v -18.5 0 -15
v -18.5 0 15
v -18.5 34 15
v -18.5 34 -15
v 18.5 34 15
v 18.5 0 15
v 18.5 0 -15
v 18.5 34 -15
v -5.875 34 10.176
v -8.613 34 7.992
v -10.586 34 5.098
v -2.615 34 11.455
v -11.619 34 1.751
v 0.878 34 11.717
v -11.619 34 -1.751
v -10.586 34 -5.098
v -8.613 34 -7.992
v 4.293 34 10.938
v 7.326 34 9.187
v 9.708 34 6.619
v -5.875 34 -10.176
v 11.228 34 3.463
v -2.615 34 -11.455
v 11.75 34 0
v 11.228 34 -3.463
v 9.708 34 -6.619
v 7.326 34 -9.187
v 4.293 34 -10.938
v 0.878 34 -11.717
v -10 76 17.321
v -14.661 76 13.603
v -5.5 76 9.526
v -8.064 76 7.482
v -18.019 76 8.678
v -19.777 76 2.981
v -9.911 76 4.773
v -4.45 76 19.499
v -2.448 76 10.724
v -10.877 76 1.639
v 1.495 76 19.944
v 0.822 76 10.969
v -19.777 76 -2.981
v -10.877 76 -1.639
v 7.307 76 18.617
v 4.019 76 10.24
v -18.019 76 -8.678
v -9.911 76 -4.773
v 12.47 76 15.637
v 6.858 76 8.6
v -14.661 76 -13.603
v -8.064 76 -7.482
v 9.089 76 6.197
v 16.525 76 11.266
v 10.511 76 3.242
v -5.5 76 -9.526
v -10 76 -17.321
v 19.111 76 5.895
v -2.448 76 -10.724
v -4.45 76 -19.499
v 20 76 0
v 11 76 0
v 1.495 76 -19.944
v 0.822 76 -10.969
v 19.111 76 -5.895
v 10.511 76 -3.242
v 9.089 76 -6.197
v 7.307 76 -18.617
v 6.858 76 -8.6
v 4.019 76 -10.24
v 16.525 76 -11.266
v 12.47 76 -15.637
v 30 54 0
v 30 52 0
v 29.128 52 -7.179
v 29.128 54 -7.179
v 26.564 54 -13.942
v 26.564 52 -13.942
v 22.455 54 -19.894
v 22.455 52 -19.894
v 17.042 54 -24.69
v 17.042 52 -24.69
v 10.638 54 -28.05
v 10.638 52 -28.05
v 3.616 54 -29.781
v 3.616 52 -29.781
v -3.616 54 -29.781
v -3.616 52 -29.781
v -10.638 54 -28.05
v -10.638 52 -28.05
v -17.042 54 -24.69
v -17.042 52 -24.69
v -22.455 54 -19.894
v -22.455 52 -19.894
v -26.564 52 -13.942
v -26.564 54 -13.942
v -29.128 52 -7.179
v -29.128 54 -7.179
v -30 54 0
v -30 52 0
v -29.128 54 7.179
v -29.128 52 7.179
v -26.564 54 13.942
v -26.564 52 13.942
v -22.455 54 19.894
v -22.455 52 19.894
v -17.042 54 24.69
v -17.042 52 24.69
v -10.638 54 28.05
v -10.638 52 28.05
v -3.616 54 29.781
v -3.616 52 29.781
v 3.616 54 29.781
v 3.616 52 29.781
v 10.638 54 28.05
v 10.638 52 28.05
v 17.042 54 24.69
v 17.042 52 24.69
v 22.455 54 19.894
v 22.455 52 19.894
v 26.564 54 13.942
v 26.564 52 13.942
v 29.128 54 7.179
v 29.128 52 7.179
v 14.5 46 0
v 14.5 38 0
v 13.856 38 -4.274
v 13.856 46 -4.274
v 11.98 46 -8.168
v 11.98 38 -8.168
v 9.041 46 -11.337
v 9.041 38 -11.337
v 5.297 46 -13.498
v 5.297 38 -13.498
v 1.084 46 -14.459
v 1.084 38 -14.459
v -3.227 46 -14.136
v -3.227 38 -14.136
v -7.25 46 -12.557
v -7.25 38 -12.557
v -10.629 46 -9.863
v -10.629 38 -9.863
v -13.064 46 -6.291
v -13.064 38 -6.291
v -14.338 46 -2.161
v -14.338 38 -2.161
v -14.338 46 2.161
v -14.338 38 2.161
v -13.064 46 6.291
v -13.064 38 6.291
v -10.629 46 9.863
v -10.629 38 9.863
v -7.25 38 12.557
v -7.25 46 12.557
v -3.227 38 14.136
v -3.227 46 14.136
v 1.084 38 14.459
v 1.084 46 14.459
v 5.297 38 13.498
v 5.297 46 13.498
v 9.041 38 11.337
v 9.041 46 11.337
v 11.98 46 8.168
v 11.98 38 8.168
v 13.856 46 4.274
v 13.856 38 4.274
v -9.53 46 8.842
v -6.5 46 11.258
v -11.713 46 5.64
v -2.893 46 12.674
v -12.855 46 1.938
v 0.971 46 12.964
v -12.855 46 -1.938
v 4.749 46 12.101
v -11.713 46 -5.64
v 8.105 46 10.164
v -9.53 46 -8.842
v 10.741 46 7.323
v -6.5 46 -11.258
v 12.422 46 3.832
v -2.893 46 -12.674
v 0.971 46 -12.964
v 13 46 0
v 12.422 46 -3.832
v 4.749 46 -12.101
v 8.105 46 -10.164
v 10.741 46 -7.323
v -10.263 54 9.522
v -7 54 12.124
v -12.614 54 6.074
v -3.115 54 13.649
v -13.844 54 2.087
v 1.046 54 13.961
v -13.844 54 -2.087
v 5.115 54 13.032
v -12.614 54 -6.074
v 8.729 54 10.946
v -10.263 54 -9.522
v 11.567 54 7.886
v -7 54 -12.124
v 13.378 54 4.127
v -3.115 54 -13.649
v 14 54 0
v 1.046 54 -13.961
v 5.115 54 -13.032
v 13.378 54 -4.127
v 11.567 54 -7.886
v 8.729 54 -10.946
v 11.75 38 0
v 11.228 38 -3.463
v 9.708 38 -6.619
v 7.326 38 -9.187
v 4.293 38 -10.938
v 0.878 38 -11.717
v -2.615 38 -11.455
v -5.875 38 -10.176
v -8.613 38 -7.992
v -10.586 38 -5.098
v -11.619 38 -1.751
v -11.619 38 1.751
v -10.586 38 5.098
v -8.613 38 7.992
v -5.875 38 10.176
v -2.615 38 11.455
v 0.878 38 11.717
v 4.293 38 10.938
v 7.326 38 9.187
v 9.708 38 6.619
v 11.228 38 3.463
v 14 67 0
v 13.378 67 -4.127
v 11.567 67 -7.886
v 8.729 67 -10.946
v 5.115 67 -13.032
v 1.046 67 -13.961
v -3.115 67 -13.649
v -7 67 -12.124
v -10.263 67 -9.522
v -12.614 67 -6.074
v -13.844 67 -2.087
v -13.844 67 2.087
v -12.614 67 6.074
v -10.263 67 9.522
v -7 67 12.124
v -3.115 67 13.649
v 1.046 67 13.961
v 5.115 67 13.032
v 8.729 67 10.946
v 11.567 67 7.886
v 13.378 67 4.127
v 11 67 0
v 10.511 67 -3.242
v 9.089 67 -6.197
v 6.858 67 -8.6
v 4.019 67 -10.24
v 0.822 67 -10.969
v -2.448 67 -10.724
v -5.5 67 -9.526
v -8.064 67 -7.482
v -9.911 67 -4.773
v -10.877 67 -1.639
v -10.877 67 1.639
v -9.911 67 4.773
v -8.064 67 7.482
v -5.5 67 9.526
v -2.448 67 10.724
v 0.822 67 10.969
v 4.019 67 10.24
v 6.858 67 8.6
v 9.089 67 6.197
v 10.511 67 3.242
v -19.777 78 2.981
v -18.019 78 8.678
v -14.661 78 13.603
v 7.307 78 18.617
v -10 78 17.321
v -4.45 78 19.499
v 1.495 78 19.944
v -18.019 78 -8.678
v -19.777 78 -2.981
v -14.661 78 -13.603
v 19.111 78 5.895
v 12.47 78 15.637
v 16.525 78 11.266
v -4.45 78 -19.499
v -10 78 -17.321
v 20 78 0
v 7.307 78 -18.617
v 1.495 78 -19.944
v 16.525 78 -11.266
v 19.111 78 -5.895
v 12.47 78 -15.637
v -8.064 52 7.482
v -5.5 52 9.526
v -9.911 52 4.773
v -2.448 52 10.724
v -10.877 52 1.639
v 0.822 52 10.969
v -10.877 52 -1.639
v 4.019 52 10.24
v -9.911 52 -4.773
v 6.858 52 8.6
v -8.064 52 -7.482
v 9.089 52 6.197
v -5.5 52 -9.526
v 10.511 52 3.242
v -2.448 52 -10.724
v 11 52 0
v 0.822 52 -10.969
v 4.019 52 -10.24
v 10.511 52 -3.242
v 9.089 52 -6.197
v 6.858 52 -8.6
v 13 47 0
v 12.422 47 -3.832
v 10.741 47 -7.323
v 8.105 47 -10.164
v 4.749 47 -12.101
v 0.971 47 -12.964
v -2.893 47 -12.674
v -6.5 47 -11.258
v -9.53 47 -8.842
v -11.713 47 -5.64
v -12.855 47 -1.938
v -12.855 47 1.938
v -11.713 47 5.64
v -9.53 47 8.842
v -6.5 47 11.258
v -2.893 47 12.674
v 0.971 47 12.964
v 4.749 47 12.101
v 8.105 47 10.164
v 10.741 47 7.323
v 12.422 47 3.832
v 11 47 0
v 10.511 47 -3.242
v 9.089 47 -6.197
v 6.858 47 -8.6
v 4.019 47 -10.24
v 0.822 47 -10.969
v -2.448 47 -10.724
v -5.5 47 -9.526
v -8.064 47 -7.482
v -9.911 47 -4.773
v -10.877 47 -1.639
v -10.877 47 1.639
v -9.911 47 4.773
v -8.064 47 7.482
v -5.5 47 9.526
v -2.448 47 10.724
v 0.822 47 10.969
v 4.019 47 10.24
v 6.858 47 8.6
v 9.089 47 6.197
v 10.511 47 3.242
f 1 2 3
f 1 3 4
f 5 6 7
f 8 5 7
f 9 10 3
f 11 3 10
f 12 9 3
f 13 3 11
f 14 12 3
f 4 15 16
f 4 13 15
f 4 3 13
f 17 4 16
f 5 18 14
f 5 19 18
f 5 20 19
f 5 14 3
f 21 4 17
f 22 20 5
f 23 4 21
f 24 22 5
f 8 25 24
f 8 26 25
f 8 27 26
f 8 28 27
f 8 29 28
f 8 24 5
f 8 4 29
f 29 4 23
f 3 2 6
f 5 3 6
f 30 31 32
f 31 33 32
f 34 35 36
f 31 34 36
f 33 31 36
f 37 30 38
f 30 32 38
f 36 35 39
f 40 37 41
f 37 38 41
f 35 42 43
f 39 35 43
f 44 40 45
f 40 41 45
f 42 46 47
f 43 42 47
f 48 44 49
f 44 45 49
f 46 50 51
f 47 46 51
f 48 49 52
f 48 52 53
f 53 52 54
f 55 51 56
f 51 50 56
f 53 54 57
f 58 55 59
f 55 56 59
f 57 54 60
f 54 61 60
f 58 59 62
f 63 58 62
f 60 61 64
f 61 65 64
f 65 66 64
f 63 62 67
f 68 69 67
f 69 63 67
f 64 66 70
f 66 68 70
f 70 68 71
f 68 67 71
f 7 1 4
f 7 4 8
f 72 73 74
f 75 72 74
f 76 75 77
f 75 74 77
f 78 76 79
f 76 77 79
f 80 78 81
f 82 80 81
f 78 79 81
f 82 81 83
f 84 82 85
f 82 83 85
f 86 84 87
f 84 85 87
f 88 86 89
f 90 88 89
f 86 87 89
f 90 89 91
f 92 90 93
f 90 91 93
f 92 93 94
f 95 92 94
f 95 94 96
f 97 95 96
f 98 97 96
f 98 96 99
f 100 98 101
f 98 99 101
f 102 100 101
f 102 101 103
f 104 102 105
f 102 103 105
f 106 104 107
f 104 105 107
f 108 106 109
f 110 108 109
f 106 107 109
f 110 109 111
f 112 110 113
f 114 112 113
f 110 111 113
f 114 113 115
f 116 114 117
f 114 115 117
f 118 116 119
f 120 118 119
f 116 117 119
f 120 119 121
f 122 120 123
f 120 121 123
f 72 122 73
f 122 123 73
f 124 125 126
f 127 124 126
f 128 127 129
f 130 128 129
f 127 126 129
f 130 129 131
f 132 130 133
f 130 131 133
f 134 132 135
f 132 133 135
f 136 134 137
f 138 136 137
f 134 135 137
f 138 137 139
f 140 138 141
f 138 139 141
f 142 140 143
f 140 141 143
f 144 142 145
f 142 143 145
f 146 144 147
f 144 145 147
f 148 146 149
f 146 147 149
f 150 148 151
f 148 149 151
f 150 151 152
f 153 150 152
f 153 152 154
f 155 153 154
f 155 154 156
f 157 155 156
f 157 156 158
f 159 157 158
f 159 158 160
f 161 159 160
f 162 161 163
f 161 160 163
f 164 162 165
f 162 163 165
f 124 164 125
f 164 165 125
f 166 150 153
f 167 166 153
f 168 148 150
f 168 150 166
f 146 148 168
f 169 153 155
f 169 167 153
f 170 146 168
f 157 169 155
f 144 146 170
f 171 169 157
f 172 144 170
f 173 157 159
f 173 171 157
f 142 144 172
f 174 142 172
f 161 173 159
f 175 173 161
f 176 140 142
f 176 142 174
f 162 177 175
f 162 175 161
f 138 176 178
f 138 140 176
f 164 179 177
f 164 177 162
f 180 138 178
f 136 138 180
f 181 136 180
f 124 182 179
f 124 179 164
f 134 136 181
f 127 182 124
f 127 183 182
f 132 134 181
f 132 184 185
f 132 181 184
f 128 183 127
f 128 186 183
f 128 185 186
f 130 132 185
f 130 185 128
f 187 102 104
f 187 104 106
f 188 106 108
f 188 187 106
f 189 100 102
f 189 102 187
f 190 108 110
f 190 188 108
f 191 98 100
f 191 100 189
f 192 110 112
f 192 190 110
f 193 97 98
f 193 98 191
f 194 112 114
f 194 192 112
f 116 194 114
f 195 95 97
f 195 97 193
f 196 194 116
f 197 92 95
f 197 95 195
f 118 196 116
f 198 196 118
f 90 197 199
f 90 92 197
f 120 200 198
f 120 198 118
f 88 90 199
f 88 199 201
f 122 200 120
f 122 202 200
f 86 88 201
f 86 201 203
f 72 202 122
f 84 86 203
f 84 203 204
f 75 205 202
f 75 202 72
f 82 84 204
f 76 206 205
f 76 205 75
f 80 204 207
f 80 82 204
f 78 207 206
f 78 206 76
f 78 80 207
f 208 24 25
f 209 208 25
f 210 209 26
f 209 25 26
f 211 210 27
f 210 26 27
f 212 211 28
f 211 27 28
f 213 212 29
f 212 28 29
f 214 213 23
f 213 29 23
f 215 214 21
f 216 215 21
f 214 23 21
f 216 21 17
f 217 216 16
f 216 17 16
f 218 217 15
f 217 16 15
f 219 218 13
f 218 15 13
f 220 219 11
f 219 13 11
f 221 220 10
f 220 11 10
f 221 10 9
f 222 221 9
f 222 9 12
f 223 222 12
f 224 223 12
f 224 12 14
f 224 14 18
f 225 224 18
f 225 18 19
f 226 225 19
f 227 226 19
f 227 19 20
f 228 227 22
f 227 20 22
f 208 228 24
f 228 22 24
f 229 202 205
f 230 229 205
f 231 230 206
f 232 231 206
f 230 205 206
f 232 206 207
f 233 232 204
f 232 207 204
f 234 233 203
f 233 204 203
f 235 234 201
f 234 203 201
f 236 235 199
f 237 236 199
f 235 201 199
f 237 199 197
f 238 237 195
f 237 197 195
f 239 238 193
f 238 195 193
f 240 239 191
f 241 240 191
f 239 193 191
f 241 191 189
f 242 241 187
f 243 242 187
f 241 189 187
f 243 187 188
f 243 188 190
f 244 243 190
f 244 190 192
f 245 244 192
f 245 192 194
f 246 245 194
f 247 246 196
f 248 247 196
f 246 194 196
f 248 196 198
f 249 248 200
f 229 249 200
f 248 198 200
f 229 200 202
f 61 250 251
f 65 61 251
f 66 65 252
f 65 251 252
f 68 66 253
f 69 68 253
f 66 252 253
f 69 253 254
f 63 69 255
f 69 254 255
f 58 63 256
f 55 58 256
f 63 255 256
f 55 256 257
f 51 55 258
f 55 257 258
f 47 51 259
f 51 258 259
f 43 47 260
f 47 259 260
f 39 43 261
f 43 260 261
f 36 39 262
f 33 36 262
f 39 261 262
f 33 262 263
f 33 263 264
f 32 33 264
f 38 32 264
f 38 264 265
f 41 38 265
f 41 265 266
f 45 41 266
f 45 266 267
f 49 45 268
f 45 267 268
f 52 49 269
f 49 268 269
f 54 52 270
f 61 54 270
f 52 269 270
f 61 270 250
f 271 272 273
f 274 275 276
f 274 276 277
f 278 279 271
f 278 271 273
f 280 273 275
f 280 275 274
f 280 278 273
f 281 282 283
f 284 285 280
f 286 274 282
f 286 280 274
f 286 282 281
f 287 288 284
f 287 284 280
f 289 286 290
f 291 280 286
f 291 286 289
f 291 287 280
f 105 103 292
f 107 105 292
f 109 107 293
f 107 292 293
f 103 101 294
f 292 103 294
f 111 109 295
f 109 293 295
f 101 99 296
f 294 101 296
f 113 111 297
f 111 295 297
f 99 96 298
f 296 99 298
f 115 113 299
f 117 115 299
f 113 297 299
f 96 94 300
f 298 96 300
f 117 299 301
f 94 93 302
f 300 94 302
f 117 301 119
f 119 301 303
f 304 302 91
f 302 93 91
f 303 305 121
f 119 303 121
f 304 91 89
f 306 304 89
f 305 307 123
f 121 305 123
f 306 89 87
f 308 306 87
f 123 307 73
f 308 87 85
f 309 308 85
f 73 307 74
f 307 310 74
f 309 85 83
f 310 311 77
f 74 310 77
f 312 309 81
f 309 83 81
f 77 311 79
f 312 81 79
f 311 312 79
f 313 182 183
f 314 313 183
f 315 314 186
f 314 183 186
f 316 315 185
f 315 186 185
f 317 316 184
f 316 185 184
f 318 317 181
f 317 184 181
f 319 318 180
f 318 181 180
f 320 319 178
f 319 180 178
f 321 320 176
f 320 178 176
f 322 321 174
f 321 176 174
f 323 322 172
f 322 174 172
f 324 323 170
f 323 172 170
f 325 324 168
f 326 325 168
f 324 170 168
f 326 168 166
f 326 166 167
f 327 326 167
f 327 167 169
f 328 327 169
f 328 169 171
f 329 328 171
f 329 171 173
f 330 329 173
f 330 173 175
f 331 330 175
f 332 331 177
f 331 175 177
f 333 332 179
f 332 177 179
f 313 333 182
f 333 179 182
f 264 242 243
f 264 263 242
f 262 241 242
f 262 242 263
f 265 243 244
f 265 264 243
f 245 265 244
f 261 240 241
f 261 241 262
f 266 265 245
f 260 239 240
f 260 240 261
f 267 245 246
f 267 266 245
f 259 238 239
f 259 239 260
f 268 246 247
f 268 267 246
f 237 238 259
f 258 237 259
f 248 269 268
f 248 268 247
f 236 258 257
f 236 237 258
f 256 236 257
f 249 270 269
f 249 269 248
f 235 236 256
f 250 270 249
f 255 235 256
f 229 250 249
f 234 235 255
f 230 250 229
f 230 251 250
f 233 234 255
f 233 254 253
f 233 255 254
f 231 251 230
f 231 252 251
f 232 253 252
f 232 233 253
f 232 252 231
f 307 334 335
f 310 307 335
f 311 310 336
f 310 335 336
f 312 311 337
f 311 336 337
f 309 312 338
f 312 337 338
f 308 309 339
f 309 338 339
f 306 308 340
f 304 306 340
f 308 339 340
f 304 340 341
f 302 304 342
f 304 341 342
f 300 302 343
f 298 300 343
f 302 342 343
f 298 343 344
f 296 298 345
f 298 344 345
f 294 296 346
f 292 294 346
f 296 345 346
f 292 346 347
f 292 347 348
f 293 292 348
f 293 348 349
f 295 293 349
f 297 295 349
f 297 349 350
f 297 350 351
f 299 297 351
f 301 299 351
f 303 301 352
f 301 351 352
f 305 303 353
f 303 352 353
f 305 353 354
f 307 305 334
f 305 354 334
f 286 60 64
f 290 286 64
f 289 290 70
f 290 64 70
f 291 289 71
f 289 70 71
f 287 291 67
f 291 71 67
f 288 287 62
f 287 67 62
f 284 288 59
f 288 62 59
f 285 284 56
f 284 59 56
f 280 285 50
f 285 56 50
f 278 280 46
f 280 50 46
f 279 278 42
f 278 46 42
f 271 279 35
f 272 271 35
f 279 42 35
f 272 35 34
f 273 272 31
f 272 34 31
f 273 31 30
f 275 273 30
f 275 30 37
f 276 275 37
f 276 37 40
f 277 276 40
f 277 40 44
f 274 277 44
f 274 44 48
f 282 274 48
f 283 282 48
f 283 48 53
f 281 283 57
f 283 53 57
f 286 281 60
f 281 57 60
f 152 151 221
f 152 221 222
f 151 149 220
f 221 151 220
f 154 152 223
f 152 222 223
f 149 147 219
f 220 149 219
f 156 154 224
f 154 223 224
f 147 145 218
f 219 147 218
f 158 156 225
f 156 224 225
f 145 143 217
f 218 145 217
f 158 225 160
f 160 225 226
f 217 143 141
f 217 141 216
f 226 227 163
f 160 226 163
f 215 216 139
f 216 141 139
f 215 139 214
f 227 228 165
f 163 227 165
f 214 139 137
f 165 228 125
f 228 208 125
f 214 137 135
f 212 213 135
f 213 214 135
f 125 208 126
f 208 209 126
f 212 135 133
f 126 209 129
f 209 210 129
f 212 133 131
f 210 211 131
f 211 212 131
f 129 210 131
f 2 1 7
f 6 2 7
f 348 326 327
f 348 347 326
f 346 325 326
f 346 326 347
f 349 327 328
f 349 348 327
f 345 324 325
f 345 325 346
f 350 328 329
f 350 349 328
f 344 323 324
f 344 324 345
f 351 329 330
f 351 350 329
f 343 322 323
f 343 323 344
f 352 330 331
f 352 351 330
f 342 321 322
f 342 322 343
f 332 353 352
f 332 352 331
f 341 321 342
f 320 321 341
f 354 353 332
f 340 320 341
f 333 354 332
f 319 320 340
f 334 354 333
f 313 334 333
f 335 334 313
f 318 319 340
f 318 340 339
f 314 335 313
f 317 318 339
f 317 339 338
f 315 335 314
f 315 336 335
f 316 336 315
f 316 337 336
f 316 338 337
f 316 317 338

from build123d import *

# Parameters (mm, degrees)
ESBO_O1_W                = 37
ESBO_O1_H                = 30
RESSALTO_EXTRUS_O1_DEPTH = 34
ESBO_O2_R                = 11.75
RESSALTO_EXTRUS_O2_DEPTH = 4
ESBO_O3_R                = 14.5
RESSALTO_EXTRUS_O3_DEPTH = 8
ESBO_O4_R                = 13
RESSALTO_EXTRUS_O4_DEPTH = 1
ESBO_O5_R                = 11
RESSALTO_EXTRUS_O5_DEPTH = 5
ESBO_O6_R                = 30
RESSALTO_EXTRUS_O6_DEPTH = 2
ESBO_O7_R                = 14
RESSALTO_EXTRUS_O7_DEPTH = 13
ESBO_O8_R                = 11
RESSALTO_EXTRUS_O8_DEPTH = 9
ESBO_O9_R                = 20
RESSALTO_EXTRUS_O9_DEPTH = 2


with BuildPart() as part:
    # Esboço1 → Ressalto-extrusão1 (new body)
    with BuildSketch(Plane(origin=(0, 0, 0), x_dir=(1, 0, 0), z_dir=(0, 1, 0))):
        Rectangle(ESBO_O1_W, ESBO_O1_H)
    extrude(amount=RESSALTO_EXTRUS_O1_DEPTH)

    # Esboço2 → Ressalto-extrusão2 (add)
    with BuildSketch(Plane(origin=(0, 34, 0), x_dir=(1, 0, 0), z_dir=(0, 1, 0))):
        Circle(ESBO_O2_R)
    extrude(amount=RESSALTO_EXTRUS_O2_DEPTH)

    # Esboço3 → Ressalto-extrusão3 (add)
    with BuildSketch(Plane(origin=(0, 38, 0), x_dir=(1, 0, 0), z_dir=(0, 1, 0))):
        Circle(ESBO_O3_R)
    extrude(amount=RESSALTO_EXTRUS_O3_DEPTH)

    # Esboço4 → Ressalto-extrusão4 (add)
    with BuildSketch(Plane(origin=(0, 46, 0), x_dir=(1, 0, 0), z_dir=(0, 1, 0))):
        Circle(ESBO_O4_R)
    extrude(amount=RESSALTO_EXTRUS_O4_DEPTH)

    # Esboço5 → Ressalto-extrusão5 (add)
    with BuildSketch(Plane(origin=(0, 47, 0), x_dir=(1, 0, 0), z_dir=(0, 1, 0))):
        Circle(ESBO_O5_R)
    extrude(amount=RESSALTO_EXTRUS_O5_DEPTH)

    # Esboço6 → Ressalto-extrusão6 (add)
    with BuildSketch(Plane(origin=(0, 52, 0), x_dir=(1, 0, 0), z_dir=(0, 1, 0))):
        Circle(ESBO_O6_R)
    extrude(amount=RESSALTO_EXTRUS_O6_DEPTH)

    # Esboço7 → Ressalto-extrusão7 (add)
    with BuildSketch(Plane(origin=(0, 54, 0), x_dir=(1, 0, 0), z_dir=(0, 1, 0))):
        Circle(ESBO_O7_R)
    extrude(amount=RESSALTO_EXTRUS_O7_DEPTH)

    # Esboço8 → Ressalto-extrusão8 (add)
    with BuildSketch(Plane(origin=(0, 67, 0), x_dir=(1, 0, 0), z_dir=(0, 1, 0))):
        Circle(ESBO_O8_R)
    extrude(amount=RESSALTO_EXTRUS_O8_DEPTH)

    # Esboço9 → Ressalto-extrusão9 (add)
    with BuildSketch(Plane(origin=(0, 76, 0), x_dir=(1, 0, 0), z_dir=(0, 1, 0))):
        Circle(ESBO_O9_R)
    extrude(amount=RESSALTO_EXTRUS_O9_DEPTH)


solid = part.part
